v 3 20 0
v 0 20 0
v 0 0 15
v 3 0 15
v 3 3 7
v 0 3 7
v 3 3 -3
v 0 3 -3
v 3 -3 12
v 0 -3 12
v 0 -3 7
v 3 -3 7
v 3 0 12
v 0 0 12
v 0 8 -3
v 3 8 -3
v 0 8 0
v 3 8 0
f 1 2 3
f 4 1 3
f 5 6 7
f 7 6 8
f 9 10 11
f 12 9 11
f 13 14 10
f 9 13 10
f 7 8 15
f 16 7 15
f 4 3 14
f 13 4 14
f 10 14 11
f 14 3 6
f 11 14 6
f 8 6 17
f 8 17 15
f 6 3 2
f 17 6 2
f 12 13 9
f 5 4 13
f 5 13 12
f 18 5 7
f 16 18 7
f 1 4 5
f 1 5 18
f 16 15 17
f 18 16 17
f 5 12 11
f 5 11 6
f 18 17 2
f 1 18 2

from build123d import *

# Parameters (mm, degrees)
BOSS_EXTRUDE1_DEPTH = 3
SKETCH2_W           = 7
SKETCH2_H           = 3
CUT_EXTRUDE1_DEPTH  = 10


with BuildPart() as part:
    # Sketch1 → Boss-Extrude1 (new body)
    with BuildSketch(Plane(origin=(0, 0, 0), x_dir=(0, 0, -1), z_dir=(1, 0, 0))):
        Polygon((0, 20), (-15, 0), (-12, 0), (-12, -3), (-7, -3), (-7, 0), (0, 0), (0, 3), (3, 3), (3, 8), (0, 8), align=None)
    extrude(amount=BOSS_EXTRUDE1_DEPTH)

    # Sketch2 → Cut-Extrude1 (cut)
    with BuildSketch(Plane(origin=(3, 0, 0), x_dir=(0, 0, -1), z_dir=(1, 0, 0))):
        with Locations((-3.5, 1.5)):
            Rectangle(SKETCH2_W, SKETCH2_H)
    extrude(amount=-CUT_EXTRUDE1_DEPTH, mode=Mode.SUBTRACT)


solid = part.part
